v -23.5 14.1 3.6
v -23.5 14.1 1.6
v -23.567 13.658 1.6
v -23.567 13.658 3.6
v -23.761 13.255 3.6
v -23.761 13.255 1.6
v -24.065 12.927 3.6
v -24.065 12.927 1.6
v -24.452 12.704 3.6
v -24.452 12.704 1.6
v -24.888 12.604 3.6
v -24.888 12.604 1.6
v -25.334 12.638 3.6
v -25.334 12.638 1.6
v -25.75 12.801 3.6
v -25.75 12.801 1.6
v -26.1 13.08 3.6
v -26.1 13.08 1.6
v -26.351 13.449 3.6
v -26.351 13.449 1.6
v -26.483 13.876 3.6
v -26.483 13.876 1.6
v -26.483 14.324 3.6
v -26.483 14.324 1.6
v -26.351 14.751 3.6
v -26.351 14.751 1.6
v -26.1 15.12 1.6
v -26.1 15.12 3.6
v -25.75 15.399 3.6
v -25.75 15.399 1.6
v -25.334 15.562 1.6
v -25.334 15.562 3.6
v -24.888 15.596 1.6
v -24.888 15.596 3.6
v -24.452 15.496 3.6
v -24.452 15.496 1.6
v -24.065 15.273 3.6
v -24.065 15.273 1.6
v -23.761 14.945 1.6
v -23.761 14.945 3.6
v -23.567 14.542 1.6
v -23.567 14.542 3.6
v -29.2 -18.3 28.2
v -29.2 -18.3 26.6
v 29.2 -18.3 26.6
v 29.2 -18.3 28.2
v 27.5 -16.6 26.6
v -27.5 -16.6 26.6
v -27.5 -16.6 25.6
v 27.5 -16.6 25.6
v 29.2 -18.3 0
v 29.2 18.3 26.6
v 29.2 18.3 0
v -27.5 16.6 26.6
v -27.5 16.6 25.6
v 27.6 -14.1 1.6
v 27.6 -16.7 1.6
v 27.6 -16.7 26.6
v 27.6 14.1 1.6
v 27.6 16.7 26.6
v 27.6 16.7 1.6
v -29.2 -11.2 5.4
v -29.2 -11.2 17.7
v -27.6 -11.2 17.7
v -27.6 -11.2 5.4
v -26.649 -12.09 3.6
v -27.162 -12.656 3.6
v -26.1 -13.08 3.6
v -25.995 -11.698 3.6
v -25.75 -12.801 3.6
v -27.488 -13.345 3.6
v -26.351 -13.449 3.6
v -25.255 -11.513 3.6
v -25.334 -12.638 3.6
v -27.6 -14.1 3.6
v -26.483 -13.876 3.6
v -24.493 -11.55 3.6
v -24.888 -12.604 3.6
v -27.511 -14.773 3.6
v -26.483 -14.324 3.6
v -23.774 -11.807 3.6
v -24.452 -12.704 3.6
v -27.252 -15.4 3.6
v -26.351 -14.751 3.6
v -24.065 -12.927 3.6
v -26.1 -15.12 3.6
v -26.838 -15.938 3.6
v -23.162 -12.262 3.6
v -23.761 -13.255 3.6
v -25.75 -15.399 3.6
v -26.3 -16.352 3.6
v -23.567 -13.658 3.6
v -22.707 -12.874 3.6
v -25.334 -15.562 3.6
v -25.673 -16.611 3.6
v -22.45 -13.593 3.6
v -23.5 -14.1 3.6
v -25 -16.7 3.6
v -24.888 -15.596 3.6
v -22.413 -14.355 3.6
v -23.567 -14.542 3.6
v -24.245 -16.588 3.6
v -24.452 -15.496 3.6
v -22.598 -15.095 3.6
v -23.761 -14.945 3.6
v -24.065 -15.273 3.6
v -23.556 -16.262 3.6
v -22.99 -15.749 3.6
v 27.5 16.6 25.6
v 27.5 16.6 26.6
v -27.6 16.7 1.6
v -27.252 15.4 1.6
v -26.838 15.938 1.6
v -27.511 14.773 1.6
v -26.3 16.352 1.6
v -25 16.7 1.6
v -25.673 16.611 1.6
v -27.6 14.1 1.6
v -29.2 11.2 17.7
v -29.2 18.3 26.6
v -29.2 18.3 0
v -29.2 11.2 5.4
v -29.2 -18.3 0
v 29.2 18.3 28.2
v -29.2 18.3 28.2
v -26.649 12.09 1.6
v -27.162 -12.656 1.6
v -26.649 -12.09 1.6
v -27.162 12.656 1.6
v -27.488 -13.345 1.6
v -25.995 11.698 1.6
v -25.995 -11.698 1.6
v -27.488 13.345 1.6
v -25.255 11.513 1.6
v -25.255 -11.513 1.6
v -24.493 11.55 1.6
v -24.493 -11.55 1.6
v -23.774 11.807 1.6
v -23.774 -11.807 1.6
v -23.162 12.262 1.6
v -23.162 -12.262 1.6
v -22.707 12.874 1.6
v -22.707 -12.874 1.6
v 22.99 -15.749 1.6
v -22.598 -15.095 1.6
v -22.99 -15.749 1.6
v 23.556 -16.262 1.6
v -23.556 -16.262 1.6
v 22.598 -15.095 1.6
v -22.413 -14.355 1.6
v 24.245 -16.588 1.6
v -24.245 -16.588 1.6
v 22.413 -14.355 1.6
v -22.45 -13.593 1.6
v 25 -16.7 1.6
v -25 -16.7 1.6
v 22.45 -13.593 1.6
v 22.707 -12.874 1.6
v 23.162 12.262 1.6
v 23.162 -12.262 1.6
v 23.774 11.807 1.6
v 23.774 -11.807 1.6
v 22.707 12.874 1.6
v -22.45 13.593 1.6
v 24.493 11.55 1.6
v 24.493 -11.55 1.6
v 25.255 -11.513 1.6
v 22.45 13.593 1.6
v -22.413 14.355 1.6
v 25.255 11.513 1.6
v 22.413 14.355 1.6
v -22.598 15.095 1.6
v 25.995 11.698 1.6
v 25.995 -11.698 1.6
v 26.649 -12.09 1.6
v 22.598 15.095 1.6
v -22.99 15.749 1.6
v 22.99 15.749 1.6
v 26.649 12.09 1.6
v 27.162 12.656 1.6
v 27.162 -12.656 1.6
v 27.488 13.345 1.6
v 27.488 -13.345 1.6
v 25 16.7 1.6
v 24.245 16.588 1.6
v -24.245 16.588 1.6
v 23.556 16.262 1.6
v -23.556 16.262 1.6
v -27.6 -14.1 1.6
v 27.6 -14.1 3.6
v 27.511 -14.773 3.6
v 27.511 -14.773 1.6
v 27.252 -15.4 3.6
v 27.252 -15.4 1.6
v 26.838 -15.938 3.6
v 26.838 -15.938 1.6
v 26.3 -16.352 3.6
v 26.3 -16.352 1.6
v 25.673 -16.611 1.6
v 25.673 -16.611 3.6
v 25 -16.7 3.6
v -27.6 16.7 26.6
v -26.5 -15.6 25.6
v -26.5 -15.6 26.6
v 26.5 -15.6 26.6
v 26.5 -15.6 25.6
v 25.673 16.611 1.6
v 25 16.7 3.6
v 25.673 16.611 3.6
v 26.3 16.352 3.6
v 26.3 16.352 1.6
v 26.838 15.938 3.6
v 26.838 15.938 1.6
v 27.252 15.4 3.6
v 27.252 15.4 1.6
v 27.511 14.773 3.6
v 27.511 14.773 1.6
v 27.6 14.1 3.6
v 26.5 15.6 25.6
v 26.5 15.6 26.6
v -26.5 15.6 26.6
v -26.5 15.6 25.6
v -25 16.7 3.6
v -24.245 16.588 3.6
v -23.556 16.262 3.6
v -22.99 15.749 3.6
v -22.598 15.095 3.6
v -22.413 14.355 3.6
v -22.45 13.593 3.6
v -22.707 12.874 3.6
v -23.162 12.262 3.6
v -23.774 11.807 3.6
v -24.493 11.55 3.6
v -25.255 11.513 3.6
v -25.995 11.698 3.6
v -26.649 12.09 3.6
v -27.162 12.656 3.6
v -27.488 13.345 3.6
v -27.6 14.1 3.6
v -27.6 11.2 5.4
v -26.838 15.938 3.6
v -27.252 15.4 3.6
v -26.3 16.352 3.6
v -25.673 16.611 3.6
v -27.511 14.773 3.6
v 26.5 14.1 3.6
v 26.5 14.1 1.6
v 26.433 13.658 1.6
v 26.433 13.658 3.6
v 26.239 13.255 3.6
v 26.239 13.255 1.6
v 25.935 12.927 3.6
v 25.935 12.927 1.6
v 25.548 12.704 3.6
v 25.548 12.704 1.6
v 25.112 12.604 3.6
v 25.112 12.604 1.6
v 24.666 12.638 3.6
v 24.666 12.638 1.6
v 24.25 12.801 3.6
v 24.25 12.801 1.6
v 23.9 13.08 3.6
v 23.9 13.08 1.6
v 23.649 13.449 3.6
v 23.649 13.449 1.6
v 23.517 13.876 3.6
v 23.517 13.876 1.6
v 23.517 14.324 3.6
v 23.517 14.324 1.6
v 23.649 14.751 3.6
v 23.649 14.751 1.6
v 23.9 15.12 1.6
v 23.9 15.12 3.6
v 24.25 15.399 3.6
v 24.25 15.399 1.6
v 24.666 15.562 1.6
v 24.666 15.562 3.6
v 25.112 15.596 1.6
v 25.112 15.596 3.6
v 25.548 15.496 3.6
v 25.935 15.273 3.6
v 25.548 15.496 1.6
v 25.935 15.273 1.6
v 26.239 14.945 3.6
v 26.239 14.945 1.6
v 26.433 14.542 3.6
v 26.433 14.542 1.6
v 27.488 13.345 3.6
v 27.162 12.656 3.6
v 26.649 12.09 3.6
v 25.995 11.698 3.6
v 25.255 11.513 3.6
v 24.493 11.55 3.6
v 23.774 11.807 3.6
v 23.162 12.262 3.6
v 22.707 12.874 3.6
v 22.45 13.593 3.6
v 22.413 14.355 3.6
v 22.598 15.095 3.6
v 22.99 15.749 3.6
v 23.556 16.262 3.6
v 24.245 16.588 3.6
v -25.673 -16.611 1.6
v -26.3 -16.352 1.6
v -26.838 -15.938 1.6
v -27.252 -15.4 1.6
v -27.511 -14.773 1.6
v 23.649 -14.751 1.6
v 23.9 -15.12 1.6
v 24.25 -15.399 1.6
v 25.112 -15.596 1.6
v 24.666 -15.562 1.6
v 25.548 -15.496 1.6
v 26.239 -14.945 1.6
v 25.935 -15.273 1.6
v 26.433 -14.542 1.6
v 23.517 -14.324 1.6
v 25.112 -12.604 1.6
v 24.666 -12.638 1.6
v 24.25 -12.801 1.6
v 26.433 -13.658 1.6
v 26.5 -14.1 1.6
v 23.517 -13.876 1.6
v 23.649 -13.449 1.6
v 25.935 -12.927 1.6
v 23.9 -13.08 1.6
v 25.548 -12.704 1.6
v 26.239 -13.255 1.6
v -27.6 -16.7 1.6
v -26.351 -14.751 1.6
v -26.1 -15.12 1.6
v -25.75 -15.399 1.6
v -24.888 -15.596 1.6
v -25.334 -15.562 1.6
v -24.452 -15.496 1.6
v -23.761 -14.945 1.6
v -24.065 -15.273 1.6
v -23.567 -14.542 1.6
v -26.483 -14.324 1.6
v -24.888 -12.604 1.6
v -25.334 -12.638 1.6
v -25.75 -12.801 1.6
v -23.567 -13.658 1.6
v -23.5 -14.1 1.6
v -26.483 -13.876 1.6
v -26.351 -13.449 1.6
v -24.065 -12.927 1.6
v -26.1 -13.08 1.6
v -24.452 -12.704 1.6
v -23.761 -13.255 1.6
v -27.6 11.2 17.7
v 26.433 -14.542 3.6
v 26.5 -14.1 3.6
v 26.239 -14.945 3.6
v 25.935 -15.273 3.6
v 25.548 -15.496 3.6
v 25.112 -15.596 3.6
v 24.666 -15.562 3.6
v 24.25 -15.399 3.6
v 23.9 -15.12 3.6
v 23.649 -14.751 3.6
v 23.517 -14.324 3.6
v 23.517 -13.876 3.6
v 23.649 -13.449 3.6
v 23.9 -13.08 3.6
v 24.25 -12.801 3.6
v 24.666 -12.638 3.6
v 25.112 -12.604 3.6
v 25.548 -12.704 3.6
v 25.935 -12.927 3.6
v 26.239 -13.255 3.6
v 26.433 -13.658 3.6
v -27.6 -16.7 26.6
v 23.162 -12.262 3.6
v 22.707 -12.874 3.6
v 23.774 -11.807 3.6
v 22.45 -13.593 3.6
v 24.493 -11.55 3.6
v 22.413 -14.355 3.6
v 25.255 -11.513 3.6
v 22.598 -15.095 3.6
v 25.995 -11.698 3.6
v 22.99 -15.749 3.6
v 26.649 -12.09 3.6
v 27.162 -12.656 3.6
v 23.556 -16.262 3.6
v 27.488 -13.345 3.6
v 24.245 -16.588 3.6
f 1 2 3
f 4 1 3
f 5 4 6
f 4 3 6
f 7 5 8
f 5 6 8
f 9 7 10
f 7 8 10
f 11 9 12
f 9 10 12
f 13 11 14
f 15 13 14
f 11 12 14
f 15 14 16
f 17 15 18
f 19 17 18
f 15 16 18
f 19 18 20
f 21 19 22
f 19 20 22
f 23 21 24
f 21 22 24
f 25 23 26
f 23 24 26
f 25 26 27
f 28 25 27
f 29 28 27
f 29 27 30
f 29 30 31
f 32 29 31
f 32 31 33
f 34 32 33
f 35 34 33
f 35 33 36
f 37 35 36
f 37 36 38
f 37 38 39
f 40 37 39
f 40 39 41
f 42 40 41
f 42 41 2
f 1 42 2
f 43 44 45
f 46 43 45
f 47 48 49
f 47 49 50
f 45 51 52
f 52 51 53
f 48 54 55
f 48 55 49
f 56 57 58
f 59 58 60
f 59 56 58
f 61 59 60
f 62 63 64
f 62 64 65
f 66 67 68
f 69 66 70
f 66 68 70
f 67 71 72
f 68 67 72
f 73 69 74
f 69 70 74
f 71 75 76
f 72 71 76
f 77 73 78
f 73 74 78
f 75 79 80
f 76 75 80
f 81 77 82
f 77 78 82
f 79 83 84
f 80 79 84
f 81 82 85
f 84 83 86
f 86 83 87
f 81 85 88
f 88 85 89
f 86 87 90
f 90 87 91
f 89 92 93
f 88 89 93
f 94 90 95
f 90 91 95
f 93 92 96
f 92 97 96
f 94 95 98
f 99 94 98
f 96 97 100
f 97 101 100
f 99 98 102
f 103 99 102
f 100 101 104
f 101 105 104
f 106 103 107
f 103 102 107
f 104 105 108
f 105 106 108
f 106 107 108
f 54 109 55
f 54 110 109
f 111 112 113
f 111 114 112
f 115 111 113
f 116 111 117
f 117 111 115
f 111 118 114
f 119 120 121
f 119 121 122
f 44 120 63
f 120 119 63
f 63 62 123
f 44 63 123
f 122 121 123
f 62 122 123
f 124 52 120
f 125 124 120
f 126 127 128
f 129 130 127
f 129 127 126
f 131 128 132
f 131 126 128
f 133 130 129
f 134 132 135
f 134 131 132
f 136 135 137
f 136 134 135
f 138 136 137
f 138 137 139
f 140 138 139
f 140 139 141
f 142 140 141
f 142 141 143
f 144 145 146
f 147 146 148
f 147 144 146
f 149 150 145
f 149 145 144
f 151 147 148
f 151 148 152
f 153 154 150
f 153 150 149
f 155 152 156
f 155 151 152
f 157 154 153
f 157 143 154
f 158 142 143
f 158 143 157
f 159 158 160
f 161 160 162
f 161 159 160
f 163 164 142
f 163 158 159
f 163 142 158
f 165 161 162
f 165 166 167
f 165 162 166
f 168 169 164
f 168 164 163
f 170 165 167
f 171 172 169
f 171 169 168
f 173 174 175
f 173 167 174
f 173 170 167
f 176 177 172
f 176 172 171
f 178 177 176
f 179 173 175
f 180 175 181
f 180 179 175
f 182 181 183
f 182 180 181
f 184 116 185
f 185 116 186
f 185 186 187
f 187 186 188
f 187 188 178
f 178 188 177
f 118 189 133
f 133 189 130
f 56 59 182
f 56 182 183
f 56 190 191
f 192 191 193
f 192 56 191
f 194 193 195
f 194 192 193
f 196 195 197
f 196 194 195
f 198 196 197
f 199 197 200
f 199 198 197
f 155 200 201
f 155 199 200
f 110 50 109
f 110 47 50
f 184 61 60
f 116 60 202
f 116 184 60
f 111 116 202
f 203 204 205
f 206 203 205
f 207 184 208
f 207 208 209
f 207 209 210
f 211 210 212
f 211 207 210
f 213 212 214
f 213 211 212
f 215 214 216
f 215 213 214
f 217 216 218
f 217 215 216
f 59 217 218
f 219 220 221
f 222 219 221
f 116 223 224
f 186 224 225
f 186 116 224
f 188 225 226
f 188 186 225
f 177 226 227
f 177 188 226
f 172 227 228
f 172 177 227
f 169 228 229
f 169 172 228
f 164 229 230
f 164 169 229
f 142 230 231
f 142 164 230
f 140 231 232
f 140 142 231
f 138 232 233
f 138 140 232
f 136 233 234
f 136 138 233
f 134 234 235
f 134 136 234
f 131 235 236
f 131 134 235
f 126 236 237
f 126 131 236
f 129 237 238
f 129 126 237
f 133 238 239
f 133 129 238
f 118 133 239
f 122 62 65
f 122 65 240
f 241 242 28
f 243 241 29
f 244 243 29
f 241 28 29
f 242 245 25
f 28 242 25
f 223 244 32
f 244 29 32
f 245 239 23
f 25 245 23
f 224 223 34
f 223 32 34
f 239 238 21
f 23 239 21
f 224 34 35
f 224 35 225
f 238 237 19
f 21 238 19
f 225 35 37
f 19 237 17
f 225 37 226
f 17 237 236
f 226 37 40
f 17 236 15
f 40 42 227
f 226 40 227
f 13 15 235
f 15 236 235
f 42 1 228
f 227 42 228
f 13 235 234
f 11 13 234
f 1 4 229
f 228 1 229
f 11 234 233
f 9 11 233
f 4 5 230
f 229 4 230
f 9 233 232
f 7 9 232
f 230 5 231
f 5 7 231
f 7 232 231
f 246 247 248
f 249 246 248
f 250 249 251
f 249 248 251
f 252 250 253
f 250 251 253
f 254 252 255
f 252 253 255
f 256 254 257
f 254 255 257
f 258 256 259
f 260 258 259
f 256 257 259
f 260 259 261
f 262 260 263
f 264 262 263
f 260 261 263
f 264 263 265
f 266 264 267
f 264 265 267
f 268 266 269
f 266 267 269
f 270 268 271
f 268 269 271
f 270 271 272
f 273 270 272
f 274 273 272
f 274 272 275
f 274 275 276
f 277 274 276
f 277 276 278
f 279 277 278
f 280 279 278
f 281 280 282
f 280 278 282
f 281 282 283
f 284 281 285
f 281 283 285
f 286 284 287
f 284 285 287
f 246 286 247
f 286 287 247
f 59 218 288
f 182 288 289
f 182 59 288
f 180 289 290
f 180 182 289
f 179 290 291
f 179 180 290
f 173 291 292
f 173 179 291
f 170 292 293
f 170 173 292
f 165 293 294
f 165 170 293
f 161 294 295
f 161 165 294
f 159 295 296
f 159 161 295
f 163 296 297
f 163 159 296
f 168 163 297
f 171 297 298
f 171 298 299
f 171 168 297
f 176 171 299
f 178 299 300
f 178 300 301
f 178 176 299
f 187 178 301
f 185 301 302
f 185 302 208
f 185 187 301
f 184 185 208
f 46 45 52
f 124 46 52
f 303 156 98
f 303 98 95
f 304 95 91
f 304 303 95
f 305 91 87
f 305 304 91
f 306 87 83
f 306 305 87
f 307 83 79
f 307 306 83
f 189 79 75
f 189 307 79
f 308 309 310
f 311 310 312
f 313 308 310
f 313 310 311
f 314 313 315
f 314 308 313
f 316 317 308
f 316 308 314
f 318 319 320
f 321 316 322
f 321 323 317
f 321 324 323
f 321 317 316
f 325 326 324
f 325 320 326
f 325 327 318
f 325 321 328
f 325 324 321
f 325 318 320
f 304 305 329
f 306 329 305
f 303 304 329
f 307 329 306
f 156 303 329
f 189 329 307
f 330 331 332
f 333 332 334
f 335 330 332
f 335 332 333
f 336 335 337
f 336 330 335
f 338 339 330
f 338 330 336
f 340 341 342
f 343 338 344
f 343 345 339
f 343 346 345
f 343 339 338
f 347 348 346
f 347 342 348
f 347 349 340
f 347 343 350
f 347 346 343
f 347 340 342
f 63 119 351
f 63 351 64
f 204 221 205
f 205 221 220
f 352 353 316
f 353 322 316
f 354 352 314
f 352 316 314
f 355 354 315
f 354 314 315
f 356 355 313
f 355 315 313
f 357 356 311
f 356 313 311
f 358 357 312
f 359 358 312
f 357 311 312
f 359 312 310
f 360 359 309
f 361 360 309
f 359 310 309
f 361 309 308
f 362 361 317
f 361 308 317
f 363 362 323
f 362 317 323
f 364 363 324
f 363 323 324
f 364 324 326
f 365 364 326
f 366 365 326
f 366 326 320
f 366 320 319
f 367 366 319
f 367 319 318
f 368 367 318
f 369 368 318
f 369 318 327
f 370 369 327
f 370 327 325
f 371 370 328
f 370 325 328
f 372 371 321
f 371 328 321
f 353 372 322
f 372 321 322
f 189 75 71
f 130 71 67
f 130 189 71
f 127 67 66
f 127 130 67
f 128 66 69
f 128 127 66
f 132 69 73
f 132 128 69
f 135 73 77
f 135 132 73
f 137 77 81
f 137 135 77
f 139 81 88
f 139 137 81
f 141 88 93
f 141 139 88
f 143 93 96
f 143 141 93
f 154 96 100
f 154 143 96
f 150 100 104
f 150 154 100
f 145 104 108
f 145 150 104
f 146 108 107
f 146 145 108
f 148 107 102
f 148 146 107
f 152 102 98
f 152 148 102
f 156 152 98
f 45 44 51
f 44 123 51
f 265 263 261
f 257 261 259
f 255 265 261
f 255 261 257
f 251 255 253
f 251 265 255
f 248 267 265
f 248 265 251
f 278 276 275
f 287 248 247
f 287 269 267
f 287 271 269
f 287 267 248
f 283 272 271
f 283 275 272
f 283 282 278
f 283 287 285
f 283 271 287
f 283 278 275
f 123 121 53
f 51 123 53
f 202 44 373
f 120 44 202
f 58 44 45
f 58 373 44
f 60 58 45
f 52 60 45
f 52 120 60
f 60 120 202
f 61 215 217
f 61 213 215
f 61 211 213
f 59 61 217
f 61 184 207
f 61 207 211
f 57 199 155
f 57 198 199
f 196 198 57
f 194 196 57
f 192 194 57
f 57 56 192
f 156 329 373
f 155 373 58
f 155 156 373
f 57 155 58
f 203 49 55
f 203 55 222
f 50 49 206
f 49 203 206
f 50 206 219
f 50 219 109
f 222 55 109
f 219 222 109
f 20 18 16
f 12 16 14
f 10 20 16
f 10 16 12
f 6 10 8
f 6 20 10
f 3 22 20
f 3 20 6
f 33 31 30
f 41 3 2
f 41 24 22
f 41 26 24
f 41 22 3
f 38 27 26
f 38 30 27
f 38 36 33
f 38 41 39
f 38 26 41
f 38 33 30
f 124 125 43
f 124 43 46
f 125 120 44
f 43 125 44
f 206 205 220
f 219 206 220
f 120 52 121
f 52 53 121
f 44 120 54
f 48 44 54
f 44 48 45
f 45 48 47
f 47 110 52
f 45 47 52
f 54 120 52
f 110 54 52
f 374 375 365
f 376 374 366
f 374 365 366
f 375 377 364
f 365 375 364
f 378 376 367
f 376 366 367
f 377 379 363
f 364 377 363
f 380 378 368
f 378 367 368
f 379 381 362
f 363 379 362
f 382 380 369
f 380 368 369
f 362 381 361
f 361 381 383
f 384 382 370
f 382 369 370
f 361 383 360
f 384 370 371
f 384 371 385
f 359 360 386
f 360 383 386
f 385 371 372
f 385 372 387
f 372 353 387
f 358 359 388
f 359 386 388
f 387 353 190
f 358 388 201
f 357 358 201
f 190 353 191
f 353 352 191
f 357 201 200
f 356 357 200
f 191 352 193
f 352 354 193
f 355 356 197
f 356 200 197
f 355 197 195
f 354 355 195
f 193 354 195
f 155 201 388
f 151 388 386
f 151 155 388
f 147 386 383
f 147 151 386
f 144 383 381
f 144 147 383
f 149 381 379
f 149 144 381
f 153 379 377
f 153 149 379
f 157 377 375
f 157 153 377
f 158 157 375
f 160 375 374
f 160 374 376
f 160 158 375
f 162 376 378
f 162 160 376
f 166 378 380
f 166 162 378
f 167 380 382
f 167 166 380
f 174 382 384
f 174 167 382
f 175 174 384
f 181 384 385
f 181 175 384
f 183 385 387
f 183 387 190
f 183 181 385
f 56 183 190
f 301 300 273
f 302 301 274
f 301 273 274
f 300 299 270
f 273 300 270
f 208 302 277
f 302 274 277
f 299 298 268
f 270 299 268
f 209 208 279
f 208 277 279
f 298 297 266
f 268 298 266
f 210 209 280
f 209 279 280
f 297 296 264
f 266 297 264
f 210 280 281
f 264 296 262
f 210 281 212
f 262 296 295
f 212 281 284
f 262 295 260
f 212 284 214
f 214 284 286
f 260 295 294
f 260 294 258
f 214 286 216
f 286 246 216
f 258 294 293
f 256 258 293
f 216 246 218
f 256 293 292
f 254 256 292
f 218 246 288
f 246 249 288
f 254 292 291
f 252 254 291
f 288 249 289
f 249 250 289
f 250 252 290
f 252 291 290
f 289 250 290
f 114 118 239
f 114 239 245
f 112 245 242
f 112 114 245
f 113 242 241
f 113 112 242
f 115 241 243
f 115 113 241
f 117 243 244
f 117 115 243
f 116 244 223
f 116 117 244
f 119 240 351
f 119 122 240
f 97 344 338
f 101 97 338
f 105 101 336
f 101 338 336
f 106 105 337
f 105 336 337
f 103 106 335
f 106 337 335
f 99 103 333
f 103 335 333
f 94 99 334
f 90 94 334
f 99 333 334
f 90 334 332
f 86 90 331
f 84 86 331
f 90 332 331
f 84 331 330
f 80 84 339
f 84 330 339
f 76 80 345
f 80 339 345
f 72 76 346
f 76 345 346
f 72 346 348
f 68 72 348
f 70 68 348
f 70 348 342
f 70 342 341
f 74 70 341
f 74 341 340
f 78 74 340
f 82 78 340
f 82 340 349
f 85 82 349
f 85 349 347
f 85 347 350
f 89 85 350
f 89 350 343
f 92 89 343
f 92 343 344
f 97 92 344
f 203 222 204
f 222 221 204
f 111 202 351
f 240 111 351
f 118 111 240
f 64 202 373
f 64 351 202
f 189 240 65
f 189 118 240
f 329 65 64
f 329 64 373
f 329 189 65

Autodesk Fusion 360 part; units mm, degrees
sketch "Base" plane through (0, 0, 0) normal (0, 0, 1) x (1, 0, 0)
  line L0 (29.2, 18.3) -> (-29.2, 18.3)
  line L1 (-29.2, 18.3) -> (-29.2, -18.3)
  line L2 (-29.2, -18.3) -> (29.2, -18.3)
  line L3 (29.2, -18.3) -> (29.2, 18.3)
  line L4 (29.2, 18.3) -> (-29.2, -18.3) construction
  line L5 (-29.2, 18.3) -> (29.2, -18.3) construction
  point P0 (-29.2, 0)
  dimension "d1" = 58.4
  dimension "d2" = 36.6
extrude "Extrusion1" add sketch "Base" along normal blind 28.2 makes body 1
shell "Schale1" thickness 1.6 removed faces 0 bodies 1
ref_plane "Arbeitsebene1" through (-27.6, -16.7, 1.6) normal (0, 0, -1) x (-1, 0, 0)
sketch "Skizze3" plane through (-27.6, -16.7, 1.6) normal (0, 0, -1) x (1, 0, 0)
  line L0 (0, 0) -> (55.2, 0)
  line L1 (0, -33.4) -> (0, 0)
  circle A0 centre (2.6, -2.6) radius 2.6
  line L2 (55.2, -33.4) -> (0, -33.4)
  circle A1 centre (2.6, -30.8) radius 2.6
  line L3 (55.2, 0) -> (55.2, -33.4)
  circle A2 centre (52.6, -30.8) radius 2.6
  circle A3 centre (52.6, -2.6) radius 2.6
  circle A4 centre (2.6, -2.6) radius 1.5
  circle A5 centre (2.6, -30.8) radius 1.5
  circle A6 centre (52.6, -30.8) radius 1.5
  circle A7 centre (52.6, -2.6) radius 1.5
  dimension "d7" = 2.6
  dimension "d8" = 2.6
  dimension "d9" = 2.6
  dimension "d10" = 2.6
  dimension "d19" = 3
  dimension "d20" = 3
  dimension "d21" = 3
  dimension "d22" = 3
extrude "Extrusion2" add sketch "Skizze3" against normal blind 2 contours A0 | A3 | A1 | A2 bodies 1
sketch "Hole" plane through (-29.2, 0, 0) normal (-1, 0, 0) x (0, -1, 0)
  line L0 (-18.3, 0) -> (18.3, 0)
  line L1 (18.3, 0) -> (18.3, 28.2)
  line L2 (18.3, 28.2) -> (-18.3, 28.2)
  line L3 (-18.3, 28.2) -> (-18.3, 0)
  line L4 (-11.2, 17.7) -> (11.2, 17.7)
  line L5 (11.2, 17.7) -> (11.2, 5.4)
  line L6 (11.2, 5.4) -> (-11.2, 5.4)
  line L7 (-11.2, 5.4) -> (-11.2, 17.7)
  line L8 (14.1, 1.6) -> (16.7, 1.6)
  line L9 (-14.1, 1.6) -> (14.1, 1.6)
  line L10 (-16.7, 1.6) -> (-14.1, 1.6)
  point P0 (0, 5.4)
  dimension "d13" = 22.4
  dimension "d14" = 12.3
extrude "Extrusion3" cut sketch "Hole" against normal blind 1.6 contours L4 L5 L6 L7 bodies 1
ref_plane "Arbeitsebene2" through (0, 0, 26.6) normal (0, 0, 1) x (1, 0, 0)
split "Teilen1" by plane through (0, 0, 26.6) normal (0, 0, 1) bodies 1 makes body 2 at (-9.7333, -6.1, 28.2)
sketch "Skizze6" plane through (0, 0, 26.6) normal (0, 0, 1) x (1, 0, 0)
  line L0 (27.6, -16.7) -> (-27.6, -16.7)
  line L1 (-27.6, -16.7) -> (-27.6, 16.7)
  line L2 (-27.6, 16.7) -> (27.6, 16.7)
  line L3 (27.6, 16.7) -> (27.6, -16.7)
  line L4 (-29.2, -18.3) -> (29.2, -18.3)
  line L5 (29.2, -18.3) -> (29.2, 18.3)
  line L6 (29.2, 18.3) -> (-29.2, 18.3)
  line L7 (-29.2, 18.3) -> (-29.2, -18.3)
sketch "Skizze7" plane through (0, 0, 26.6) normal (0, 0, 1) x (1, 0, 0)
  line L0 (29.2, -18.3) -> (-29.2, -18.3)
  line L1 (-29.2, -18.3) -> (-29.2, 18.3)
  line L2 (-29.2, 18.3) -> (29.2, 18.3)
  line L3 (29.2, 18.3) -> (29.2, -18.3)
  line L4 (-27.6, -16.7) -> (27.6, -16.7)
  line L5 (27.6, -16.7) -> (27.6, 16.7)
  line L6 (27.6, 16.7) -> (-27.6, 16.7)
  line L7 (-27.6, 16.7) -> (-27.6, -16.7)
  line L8 (-27.5, 16.6) -> (-27.5, -16.6)
  line L9 (-27.5, -16.6) -> (27.5, -16.6)
  line L10 (27.5, -16.6) -> (27.5, 16.6)
  line L11 (27.5, 16.6) -> (-27.5, 16.6)
  line L12 (27.6, -16.7) -> (-27.6, -16.7)
  line L13 (-27.6, -16.7) -> (-27.6, 16.7)
  line L14 (-27.6, 16.7) -> (27.6, 16.7)
  line L15 (27.6, 16.7) -> (27.6, -16.7)
  line L16 (-29.2, -18.3) -> (29.2, -18.3)
  line L17 (29.2, -18.3) -> (29.2, 18.3)
  line L18 (29.2, 18.3) -> (-29.2, 18.3)
  line L19 (-29.2, 18.3) -> (-29.2, -18.3)
  line L20 (26.5, -15.6) -> (26.5, 15.6)
  line L21 (26.5, 15.6) -> (-26.5, 15.6)
  line L22 (-26.5, 15.6) -> (-26.5, -15.6)
  line L23 (-26.5, -15.6) -> (26.5, -15.6)
  point P0 (-27.6, -16.7)
  dimension "d24" = -0.1
  dimension "d25" = -1.1
extrude "Extrusion4" add sketch "Skizze7" against normal blind 1 contours L8 L9 L10 L11 bodies 2
equation "d1 = 55.2 mm + 2 * wall_thickness"
equation "d2 = 33.4 mm + 2 * wall_thickness"
equation "d3 = 25 mm + 2 * wall_thickness"
equation "d5 = wall_thickness"
equation "wall_thickness = 1.6 mm"
equation "d17 = -wall_thickness"
equation "d23 = -wall_thickness"
